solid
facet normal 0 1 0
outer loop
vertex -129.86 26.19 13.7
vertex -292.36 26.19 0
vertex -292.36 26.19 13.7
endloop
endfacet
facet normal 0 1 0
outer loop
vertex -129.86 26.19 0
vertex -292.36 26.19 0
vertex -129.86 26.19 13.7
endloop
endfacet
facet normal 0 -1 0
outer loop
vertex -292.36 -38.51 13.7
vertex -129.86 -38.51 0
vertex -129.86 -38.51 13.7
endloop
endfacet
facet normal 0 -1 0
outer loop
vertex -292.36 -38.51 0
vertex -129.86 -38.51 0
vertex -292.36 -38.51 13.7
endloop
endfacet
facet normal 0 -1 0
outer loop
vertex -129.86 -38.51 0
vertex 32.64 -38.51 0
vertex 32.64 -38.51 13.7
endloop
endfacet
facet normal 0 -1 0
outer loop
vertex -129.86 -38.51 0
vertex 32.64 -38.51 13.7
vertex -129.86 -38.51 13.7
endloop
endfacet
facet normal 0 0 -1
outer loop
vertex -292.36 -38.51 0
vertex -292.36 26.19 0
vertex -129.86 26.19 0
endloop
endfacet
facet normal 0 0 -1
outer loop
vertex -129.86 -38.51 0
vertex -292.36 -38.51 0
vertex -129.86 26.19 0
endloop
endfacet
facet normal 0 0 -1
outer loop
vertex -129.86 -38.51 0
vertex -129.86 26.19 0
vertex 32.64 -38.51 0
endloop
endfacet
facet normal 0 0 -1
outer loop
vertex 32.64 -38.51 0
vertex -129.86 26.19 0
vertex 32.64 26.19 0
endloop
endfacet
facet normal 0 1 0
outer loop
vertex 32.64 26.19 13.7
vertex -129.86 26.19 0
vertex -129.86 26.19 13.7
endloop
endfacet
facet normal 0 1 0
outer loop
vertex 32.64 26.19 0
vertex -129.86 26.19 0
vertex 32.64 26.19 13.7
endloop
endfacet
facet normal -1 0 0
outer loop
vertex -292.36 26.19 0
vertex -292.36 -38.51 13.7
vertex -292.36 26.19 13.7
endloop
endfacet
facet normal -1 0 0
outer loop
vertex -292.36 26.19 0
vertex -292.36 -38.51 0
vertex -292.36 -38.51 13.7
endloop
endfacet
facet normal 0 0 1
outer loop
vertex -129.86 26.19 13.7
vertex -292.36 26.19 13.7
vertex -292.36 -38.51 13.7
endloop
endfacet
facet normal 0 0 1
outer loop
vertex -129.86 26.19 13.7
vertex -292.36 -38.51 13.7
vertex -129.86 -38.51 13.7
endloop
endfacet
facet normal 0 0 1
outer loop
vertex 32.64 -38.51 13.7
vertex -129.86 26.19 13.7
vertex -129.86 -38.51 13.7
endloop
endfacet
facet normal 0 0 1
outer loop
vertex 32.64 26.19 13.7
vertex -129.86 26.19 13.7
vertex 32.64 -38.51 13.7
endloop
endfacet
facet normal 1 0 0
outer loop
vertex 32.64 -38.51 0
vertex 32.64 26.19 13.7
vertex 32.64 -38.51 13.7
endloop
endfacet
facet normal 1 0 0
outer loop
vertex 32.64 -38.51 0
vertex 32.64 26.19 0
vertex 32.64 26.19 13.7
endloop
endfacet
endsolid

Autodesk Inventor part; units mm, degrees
ref_plane "YZ Plane" through (0, 0, 0) normal (1, 0, 0) x (0, 1, 0)
ref_plane "XZ Plane" through (0, 0, 0) normal (0, 1, 0) x (-1, 0, 0)
ref_plane "XY Plane" through (0, 0, 0) normal (0, 0, 1) x (1, 0, 0)
sketch "Boceto1" plane through (0, 0, 0) normal (0, 0, 1) x (1, 0, 0)
  line L0 (-129.86, -38.51) -> (-129.86, -45.51) projected
  line L1 (-129.86, -45.51) -> (39.14, -45.51) projected
  arc A0 (39.14, -45.51) -> (39.64, -45.01) centre (39.14, -45.01) ccw projected
  line L2 (39.64, -45.01) -> (39.64, 32.69) projected
  arc A1 (39.64, 32.69) -> (39.14, 33.19) centre (39.14, 32.69) ccw projected
  line L3 (39.14, 33.19) -> (-129.86, 33.19) projected
  line L4 (-129.86, 33.19) -> (-129.86, 26.19) projected
  line L5 (-129.86, 26.19) -> (32.64, 26.19) projected
  line L6 (32.64, 26.19) -> (32.64, -38.51) projected
  line L7 (32.64, -38.51) -> (-129.86, -38.51) projected
  circle A2 centre (36.14, 29.69) radius 2.15 projected
  circle A3 centre (36.14, -42.01) radius 2.15 projected
  circle A4 centre (-74.5267, 29.69) radius 2.15 projected
  circle A5 centre (-74.5267, -42.01) radius 2.15 projected
  line L8 (-129.86, -45.51) -> (-129.86, -38.51) projected
  line L9 (-129.86, -38.51) -> (-292.36, -38.51) projected
  line L10 (-292.36, -38.51) -> (-292.36, 26.19) projected
  line L11 (-292.36, 26.19) -> (-129.86, 26.19) projected
  line L12 (-129.86, 26.19) -> (-129.86, 33.19) projected
  line L13 (-129.86, 33.19) -> (-298.86, 33.19) projected
  arc A6 (-298.86, 33.19) -> (-299.36, 32.69) centre (-298.86, 32.69) ccw projected
  line L14 (-299.36, 32.69) -> (-299.36, -45.01) projected
  arc A7 (-299.36, -45.01) -> (-298.86, -45.51) centre (-298.86, -45.01) ccw projected
  line L15 (-298.86, -45.51) -> (-129.86, -45.51) projected
  circle A8 centre (-185.1933, 29.69) radius 2.15 projected
  circle A9 centre (-295.86, -42.01) radius 2.15 projected
  circle A10 centre (-295.86, 29.69) radius 2.15 projected
  circle A11 centre (-185.1933, -42.01) radius 2.15 projected
  line L16 (32.64, -38.51) -> (-292.36, -38.51)
  line L17 (-292.36, -38.51) -> (-292.36, 26.19)
  line L18 (-292.36, 26.19) -> (32.64, 26.19)
  line L19 (32.64, 26.19) -> (32.64, -38.51)
  point P0 (0, 0)
extrude "Extrusión1" add sketch "Boceto1" along normal blind 13.7 contours L9 L10 L11 L5 L6 L7
properties part number "Matrices"
